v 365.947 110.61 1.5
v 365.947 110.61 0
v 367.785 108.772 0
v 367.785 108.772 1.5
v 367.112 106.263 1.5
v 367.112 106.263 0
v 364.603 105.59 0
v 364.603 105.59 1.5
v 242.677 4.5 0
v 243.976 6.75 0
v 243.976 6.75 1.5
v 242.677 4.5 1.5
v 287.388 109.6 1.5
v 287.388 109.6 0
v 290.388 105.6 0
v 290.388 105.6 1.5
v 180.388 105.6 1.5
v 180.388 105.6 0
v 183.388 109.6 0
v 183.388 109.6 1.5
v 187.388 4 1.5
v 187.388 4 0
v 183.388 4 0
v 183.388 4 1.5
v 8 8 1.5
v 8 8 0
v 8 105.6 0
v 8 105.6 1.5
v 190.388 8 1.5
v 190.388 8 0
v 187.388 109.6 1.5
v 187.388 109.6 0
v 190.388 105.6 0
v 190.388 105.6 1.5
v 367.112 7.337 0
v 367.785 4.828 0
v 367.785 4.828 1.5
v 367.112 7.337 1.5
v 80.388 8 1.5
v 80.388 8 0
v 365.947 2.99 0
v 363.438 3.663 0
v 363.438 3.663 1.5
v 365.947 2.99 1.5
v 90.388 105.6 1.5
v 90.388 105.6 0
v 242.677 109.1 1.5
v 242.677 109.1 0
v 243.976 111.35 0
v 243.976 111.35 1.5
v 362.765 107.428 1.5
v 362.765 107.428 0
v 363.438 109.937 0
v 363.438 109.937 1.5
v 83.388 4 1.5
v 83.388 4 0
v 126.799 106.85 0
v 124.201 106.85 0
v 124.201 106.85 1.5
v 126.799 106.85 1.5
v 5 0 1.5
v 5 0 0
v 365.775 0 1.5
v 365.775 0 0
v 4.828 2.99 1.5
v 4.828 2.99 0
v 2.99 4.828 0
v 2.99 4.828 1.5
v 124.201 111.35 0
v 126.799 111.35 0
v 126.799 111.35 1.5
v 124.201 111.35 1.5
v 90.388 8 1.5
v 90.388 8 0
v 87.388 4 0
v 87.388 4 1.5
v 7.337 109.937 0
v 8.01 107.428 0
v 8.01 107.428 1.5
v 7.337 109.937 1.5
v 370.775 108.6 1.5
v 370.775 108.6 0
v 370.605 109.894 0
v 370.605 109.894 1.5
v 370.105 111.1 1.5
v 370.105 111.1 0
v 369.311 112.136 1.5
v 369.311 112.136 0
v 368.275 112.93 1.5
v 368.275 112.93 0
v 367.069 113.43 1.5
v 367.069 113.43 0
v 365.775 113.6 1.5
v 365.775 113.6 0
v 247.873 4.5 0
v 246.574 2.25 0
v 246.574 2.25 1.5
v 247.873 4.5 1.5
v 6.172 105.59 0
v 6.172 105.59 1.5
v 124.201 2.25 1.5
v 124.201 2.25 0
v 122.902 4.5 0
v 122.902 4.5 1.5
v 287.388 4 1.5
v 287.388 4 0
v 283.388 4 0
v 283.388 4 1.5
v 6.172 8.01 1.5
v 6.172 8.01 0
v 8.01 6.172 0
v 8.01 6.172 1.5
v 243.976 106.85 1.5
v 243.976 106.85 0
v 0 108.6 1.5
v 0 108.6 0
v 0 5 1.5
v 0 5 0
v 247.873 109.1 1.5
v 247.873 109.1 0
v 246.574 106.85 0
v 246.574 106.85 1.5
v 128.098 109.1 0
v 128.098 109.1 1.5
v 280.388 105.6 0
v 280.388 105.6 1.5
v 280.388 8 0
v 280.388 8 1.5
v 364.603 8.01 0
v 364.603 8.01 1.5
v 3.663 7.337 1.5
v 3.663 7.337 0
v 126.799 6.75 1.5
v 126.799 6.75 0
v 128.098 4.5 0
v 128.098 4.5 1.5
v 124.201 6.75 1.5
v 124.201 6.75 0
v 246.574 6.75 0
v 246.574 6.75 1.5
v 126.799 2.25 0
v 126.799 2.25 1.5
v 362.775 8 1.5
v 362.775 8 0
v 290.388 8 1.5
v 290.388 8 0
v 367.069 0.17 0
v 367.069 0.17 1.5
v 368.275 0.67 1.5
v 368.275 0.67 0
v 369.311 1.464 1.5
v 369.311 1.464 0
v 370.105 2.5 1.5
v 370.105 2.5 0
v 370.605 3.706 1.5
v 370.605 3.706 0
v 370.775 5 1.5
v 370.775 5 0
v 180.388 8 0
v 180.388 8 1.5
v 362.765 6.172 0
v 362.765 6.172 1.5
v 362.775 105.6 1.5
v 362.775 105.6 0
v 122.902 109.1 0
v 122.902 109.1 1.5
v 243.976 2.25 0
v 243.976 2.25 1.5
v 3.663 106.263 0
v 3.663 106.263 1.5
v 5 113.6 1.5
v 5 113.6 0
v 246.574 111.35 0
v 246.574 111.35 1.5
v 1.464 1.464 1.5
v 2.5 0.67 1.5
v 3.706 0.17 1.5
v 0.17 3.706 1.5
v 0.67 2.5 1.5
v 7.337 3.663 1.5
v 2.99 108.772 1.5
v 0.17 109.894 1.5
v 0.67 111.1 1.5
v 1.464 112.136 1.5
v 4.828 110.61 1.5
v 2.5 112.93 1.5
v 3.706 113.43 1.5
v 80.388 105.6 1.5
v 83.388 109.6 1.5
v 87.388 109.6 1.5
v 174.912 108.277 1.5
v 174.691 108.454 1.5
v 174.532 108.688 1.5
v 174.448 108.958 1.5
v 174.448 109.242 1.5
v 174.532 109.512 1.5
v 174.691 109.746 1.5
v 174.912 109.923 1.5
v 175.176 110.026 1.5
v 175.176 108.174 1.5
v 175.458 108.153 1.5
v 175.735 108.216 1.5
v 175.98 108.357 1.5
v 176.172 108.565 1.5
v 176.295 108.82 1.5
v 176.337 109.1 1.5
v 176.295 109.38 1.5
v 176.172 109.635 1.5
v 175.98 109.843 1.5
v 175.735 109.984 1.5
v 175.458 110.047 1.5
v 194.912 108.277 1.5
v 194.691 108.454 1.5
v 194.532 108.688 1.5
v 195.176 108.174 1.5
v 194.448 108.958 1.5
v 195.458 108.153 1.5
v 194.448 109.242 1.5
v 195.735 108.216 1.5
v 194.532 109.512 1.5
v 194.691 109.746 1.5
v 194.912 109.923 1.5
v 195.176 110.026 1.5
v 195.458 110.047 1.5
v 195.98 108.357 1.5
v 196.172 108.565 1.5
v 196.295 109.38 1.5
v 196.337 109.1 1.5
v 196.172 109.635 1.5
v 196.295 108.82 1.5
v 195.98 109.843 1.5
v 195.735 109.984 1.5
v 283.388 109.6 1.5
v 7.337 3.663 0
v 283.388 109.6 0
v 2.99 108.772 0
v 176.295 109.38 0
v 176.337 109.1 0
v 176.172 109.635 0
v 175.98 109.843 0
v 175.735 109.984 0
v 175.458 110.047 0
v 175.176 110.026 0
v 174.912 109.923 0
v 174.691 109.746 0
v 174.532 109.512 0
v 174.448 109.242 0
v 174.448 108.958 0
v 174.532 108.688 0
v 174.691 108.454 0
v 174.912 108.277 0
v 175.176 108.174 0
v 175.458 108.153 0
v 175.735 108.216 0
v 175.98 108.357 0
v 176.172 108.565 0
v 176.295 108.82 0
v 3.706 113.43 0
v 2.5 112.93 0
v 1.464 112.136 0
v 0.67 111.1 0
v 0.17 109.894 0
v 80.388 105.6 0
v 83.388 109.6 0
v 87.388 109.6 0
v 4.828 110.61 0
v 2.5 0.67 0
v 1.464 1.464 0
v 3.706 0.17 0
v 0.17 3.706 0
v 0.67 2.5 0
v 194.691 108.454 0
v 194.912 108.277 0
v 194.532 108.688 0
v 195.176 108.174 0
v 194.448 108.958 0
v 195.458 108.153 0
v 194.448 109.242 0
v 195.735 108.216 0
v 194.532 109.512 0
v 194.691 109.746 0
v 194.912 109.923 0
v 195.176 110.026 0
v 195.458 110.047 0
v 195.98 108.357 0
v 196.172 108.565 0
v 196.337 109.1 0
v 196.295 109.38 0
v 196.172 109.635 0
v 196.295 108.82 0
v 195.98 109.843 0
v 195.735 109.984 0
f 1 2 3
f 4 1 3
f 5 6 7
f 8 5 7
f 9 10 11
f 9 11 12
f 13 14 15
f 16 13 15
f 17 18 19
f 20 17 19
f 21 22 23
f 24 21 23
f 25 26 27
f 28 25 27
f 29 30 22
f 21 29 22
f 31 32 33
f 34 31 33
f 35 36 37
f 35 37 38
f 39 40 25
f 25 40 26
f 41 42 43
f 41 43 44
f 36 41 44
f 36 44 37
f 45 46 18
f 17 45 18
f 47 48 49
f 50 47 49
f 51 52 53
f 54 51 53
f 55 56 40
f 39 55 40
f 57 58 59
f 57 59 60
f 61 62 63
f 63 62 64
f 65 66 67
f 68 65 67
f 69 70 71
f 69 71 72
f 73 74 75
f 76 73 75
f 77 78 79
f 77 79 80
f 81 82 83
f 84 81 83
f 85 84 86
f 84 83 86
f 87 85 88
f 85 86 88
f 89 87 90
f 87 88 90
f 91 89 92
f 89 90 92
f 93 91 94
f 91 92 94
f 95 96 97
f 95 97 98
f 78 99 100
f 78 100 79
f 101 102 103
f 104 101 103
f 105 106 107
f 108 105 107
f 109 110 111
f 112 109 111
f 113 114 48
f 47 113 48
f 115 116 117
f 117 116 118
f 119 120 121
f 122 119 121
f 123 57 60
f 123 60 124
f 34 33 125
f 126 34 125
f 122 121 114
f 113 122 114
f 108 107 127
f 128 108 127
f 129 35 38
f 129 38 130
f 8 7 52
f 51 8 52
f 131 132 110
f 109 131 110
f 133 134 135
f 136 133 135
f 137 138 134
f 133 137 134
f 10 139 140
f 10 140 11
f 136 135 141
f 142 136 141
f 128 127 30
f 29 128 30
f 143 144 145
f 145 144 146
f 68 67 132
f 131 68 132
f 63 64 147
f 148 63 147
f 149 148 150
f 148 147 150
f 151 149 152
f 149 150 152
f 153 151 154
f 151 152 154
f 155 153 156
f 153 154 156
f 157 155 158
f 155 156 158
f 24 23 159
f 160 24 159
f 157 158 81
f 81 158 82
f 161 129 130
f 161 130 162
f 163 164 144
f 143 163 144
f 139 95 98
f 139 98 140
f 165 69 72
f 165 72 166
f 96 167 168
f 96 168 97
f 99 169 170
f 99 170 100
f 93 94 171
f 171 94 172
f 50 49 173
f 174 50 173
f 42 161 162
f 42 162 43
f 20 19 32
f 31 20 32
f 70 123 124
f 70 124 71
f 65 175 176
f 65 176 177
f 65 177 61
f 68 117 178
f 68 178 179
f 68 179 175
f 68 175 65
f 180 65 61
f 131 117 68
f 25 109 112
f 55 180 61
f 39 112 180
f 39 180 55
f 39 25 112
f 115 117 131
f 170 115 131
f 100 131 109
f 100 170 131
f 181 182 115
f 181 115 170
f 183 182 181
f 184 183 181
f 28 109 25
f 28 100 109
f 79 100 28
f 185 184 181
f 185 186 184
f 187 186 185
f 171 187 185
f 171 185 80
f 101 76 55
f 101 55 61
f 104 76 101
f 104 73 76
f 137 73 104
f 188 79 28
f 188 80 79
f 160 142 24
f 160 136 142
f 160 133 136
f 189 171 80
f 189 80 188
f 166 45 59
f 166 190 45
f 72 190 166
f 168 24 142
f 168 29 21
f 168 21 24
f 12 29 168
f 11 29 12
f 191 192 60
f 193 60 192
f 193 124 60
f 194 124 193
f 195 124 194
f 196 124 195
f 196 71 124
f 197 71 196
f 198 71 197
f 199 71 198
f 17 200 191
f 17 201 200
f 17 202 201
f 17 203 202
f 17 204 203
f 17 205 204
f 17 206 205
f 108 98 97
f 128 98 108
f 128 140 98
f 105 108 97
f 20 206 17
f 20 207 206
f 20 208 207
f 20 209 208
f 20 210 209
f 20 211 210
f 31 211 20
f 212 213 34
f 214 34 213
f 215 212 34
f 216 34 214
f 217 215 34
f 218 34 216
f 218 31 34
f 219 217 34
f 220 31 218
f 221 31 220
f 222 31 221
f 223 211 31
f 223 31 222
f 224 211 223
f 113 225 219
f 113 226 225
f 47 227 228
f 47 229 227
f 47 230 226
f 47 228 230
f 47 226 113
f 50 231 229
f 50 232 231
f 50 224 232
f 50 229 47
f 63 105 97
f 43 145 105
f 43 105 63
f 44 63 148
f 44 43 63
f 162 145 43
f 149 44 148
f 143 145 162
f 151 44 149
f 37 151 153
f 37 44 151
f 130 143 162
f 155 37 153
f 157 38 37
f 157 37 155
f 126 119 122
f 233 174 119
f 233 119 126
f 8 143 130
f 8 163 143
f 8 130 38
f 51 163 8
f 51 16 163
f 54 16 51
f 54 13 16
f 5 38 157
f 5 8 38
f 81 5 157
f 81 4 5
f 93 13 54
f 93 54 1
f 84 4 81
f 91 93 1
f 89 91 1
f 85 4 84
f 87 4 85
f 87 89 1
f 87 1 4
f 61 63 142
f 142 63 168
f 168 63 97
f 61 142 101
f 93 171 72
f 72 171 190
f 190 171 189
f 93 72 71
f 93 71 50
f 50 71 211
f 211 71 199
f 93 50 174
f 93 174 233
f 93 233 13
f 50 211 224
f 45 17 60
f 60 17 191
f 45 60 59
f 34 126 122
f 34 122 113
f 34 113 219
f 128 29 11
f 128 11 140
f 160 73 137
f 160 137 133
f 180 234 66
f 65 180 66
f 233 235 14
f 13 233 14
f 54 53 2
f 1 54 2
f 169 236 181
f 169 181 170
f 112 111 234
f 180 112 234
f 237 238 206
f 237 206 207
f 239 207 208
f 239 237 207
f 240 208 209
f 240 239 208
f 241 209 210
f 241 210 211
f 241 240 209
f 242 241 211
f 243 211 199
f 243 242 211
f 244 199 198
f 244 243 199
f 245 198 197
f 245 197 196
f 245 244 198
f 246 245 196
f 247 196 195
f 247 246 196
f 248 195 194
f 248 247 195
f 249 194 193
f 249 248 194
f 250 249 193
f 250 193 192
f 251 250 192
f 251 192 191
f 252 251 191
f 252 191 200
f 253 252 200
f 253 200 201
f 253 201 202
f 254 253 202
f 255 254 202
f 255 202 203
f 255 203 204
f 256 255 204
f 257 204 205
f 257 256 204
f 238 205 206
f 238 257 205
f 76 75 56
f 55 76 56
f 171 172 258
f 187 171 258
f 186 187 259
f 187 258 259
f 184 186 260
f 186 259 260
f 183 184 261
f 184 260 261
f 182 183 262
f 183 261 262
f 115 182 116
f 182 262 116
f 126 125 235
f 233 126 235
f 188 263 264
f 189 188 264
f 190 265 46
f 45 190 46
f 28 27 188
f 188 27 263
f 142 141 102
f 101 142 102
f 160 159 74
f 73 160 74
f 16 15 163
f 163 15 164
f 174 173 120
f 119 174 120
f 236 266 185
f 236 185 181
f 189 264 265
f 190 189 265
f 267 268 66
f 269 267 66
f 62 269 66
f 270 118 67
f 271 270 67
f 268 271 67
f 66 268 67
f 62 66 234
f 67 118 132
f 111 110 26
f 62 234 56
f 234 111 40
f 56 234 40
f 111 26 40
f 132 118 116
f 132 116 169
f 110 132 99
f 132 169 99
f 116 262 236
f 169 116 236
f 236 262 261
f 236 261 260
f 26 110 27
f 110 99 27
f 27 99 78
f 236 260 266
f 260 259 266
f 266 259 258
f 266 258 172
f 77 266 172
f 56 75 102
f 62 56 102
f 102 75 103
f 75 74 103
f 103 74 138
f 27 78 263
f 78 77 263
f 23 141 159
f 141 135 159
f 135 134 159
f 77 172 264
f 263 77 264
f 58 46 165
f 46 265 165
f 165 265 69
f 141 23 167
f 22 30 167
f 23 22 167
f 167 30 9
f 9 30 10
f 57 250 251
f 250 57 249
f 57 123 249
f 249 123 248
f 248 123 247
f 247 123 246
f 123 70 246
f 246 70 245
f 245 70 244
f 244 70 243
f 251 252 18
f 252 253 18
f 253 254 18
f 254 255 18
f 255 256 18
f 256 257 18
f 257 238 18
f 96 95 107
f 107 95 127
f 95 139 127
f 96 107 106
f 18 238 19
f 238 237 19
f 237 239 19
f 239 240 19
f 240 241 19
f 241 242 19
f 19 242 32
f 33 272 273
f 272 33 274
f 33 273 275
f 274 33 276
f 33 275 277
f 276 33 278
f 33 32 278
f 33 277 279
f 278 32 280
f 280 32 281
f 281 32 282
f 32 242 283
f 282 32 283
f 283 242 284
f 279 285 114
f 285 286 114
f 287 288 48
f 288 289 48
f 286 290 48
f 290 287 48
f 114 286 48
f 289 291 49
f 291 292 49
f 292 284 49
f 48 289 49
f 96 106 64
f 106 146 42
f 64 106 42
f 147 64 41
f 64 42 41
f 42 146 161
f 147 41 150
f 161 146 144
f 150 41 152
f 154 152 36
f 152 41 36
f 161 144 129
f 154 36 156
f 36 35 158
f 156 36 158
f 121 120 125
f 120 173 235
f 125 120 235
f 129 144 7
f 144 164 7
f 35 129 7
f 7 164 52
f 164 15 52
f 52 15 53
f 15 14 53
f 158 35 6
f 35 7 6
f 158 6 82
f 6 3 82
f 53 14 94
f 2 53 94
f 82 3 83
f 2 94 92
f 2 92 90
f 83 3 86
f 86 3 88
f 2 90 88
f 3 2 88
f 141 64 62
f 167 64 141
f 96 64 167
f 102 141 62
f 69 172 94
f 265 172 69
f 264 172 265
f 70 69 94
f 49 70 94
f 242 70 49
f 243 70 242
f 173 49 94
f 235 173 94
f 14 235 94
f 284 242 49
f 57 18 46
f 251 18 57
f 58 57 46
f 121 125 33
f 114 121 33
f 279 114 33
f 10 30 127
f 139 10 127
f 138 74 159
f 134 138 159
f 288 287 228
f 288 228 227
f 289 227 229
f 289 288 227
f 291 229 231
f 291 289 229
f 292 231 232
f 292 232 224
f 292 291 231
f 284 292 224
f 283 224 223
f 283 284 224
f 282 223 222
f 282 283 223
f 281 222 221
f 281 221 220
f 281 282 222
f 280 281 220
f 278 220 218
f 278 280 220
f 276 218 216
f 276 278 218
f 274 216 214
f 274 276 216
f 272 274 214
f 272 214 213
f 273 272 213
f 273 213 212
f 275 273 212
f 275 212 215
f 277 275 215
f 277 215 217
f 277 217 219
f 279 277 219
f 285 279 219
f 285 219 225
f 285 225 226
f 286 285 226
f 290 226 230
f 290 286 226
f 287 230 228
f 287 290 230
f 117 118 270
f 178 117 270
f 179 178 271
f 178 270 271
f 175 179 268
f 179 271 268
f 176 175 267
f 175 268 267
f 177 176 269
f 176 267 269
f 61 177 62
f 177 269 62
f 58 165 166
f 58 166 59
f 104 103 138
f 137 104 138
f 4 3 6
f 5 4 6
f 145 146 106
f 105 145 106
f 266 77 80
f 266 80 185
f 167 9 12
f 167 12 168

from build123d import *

# Parameters (mm, degrees)
MODEL_R             = 0.95
BOSS_EXTRUDE1_DEPTH = 1.5


with BuildPart() as part:
    # Model → Boss-Extrude1 (new body)
    with BuildSketch(Plane.XY):
        with BuildLine():
            Line((0, 108.6), (0, 5))
            ThreePointArc((0, 5), (1.464466094, 1.464466094), (5, 0))
            Line((5, 0), (365.775, 0))
            ThreePointArc((365.775, 0), (369.310533906, 1.464466094), (370.775, 5))
            Line((370.775, 5), (370.775, 108.6))
            ThreePointArc((370.775, 108.6), (369.310533906, 112.135533906), (365.775, 113.6))
            Line((365.775, 113.6), (5, 113.6))
            ThreePointArc((5, 113.6), (1.464466094, 112.135533906), (0, 108.6))
        make_face()
        with Locations((175.3875, 109.1)):
            Circle(MODEL_R, mode=Mode.SUBTRACT)
        with Locations((195.3875, 109.1)):
            Circle(MODEL_R, mode=Mode.SUBTRACT)
        Polygon((8, 8), (8, 105.6), (80.3875, 105.6), (83.3875, 109.6), (87.3875, 109.6), (90.3875, 105.6), (180.3875, 105.6), (183.3875, 109.6), (187.3875, 109.6), (190.3875, 105.6), (280.3875, 105.6), (283.3875, 109.6), (287.3875, 109.6), (290.3875, 105.6), (362.775, 105.6), (362.775, 8), (290.3875, 8), (287.3875, 4), (283.3875, 4), (280.3875, 8), (190.3875, 8), (187.3875, 4), (183.3875, 4), (180.3875, 8), (90.3875, 8), (87.3875, 4), (83.3875, 4), (80.3875, 8), align=None, mode=Mode.SUBTRACT)
        Polygon((365.947431604, 110.609548911), (367.784548911, 108.772431604), (367.112117307, 106.262882693), (364.602568396, 105.590451089), (362.765451089, 107.427568396), (363.437882693, 109.937117307), align=None, mode=Mode.SUBTRACT)
        Polygon((4.827568396, 110.609548911), (2.990451089, 108.772431604), (3.662882693, 106.262882693), (6.172431604, 105.590451089), (8.009548911, 107.427568396), (7.337117307, 109.937117307), align=None, mode=Mode.SUBTRACT)
        Polygon((365.947431604, 2.990451089), (367.784548911, 4.827568396), (367.112117307, 7.337117307), (364.602568396, 8.009548911), (362.765451089, 6.172431604), (363.437882693, 3.662882693), align=None, mode=Mode.SUBTRACT)
        Polygon((126.799038106, 2.25), (124.200961894, 2.25), (122.901923789, 4.5), (124.200961894, 6.75), (126.799038106, 6.75), (128.098076211, 4.5), align=None, mode=Mode.SUBTRACT)
        Polygon((4.827568396, 2.990451089), (2.990451089, 4.827568396), (3.662882693, 7.337117307), (6.172431604, 8.009548911), (8.009548911, 6.172431604), (7.337117307, 3.662882693), align=None, mode=Mode.SUBTRACT)
        Polygon((243.975961894, 2.25), (246.574038106, 2.25), (247.873076211, 4.5), (246.574038106, 6.75), (243.975961894, 6.75), (242.676923789, 4.5), align=None, mode=Mode.SUBTRACT)
        Polygon((126.799038106, 111.35), (124.200961894, 111.35), (122.901923789, 109.1), (124.200961894, 106.85), (126.799038106, 106.85), (128.098076211, 109.1), align=None, mode=Mode.SUBTRACT)
        Polygon((243.975961894, 111.35), (246.574038106, 111.35), (247.873076211, 109.1), (246.574038106, 106.85), (243.975961894, 106.85), (242.676923789, 109.1), align=None, mode=Mode.SUBTRACT)
    extrude(amount=BOSS_EXTRUDE1_DEPTH)


solid = part.part
